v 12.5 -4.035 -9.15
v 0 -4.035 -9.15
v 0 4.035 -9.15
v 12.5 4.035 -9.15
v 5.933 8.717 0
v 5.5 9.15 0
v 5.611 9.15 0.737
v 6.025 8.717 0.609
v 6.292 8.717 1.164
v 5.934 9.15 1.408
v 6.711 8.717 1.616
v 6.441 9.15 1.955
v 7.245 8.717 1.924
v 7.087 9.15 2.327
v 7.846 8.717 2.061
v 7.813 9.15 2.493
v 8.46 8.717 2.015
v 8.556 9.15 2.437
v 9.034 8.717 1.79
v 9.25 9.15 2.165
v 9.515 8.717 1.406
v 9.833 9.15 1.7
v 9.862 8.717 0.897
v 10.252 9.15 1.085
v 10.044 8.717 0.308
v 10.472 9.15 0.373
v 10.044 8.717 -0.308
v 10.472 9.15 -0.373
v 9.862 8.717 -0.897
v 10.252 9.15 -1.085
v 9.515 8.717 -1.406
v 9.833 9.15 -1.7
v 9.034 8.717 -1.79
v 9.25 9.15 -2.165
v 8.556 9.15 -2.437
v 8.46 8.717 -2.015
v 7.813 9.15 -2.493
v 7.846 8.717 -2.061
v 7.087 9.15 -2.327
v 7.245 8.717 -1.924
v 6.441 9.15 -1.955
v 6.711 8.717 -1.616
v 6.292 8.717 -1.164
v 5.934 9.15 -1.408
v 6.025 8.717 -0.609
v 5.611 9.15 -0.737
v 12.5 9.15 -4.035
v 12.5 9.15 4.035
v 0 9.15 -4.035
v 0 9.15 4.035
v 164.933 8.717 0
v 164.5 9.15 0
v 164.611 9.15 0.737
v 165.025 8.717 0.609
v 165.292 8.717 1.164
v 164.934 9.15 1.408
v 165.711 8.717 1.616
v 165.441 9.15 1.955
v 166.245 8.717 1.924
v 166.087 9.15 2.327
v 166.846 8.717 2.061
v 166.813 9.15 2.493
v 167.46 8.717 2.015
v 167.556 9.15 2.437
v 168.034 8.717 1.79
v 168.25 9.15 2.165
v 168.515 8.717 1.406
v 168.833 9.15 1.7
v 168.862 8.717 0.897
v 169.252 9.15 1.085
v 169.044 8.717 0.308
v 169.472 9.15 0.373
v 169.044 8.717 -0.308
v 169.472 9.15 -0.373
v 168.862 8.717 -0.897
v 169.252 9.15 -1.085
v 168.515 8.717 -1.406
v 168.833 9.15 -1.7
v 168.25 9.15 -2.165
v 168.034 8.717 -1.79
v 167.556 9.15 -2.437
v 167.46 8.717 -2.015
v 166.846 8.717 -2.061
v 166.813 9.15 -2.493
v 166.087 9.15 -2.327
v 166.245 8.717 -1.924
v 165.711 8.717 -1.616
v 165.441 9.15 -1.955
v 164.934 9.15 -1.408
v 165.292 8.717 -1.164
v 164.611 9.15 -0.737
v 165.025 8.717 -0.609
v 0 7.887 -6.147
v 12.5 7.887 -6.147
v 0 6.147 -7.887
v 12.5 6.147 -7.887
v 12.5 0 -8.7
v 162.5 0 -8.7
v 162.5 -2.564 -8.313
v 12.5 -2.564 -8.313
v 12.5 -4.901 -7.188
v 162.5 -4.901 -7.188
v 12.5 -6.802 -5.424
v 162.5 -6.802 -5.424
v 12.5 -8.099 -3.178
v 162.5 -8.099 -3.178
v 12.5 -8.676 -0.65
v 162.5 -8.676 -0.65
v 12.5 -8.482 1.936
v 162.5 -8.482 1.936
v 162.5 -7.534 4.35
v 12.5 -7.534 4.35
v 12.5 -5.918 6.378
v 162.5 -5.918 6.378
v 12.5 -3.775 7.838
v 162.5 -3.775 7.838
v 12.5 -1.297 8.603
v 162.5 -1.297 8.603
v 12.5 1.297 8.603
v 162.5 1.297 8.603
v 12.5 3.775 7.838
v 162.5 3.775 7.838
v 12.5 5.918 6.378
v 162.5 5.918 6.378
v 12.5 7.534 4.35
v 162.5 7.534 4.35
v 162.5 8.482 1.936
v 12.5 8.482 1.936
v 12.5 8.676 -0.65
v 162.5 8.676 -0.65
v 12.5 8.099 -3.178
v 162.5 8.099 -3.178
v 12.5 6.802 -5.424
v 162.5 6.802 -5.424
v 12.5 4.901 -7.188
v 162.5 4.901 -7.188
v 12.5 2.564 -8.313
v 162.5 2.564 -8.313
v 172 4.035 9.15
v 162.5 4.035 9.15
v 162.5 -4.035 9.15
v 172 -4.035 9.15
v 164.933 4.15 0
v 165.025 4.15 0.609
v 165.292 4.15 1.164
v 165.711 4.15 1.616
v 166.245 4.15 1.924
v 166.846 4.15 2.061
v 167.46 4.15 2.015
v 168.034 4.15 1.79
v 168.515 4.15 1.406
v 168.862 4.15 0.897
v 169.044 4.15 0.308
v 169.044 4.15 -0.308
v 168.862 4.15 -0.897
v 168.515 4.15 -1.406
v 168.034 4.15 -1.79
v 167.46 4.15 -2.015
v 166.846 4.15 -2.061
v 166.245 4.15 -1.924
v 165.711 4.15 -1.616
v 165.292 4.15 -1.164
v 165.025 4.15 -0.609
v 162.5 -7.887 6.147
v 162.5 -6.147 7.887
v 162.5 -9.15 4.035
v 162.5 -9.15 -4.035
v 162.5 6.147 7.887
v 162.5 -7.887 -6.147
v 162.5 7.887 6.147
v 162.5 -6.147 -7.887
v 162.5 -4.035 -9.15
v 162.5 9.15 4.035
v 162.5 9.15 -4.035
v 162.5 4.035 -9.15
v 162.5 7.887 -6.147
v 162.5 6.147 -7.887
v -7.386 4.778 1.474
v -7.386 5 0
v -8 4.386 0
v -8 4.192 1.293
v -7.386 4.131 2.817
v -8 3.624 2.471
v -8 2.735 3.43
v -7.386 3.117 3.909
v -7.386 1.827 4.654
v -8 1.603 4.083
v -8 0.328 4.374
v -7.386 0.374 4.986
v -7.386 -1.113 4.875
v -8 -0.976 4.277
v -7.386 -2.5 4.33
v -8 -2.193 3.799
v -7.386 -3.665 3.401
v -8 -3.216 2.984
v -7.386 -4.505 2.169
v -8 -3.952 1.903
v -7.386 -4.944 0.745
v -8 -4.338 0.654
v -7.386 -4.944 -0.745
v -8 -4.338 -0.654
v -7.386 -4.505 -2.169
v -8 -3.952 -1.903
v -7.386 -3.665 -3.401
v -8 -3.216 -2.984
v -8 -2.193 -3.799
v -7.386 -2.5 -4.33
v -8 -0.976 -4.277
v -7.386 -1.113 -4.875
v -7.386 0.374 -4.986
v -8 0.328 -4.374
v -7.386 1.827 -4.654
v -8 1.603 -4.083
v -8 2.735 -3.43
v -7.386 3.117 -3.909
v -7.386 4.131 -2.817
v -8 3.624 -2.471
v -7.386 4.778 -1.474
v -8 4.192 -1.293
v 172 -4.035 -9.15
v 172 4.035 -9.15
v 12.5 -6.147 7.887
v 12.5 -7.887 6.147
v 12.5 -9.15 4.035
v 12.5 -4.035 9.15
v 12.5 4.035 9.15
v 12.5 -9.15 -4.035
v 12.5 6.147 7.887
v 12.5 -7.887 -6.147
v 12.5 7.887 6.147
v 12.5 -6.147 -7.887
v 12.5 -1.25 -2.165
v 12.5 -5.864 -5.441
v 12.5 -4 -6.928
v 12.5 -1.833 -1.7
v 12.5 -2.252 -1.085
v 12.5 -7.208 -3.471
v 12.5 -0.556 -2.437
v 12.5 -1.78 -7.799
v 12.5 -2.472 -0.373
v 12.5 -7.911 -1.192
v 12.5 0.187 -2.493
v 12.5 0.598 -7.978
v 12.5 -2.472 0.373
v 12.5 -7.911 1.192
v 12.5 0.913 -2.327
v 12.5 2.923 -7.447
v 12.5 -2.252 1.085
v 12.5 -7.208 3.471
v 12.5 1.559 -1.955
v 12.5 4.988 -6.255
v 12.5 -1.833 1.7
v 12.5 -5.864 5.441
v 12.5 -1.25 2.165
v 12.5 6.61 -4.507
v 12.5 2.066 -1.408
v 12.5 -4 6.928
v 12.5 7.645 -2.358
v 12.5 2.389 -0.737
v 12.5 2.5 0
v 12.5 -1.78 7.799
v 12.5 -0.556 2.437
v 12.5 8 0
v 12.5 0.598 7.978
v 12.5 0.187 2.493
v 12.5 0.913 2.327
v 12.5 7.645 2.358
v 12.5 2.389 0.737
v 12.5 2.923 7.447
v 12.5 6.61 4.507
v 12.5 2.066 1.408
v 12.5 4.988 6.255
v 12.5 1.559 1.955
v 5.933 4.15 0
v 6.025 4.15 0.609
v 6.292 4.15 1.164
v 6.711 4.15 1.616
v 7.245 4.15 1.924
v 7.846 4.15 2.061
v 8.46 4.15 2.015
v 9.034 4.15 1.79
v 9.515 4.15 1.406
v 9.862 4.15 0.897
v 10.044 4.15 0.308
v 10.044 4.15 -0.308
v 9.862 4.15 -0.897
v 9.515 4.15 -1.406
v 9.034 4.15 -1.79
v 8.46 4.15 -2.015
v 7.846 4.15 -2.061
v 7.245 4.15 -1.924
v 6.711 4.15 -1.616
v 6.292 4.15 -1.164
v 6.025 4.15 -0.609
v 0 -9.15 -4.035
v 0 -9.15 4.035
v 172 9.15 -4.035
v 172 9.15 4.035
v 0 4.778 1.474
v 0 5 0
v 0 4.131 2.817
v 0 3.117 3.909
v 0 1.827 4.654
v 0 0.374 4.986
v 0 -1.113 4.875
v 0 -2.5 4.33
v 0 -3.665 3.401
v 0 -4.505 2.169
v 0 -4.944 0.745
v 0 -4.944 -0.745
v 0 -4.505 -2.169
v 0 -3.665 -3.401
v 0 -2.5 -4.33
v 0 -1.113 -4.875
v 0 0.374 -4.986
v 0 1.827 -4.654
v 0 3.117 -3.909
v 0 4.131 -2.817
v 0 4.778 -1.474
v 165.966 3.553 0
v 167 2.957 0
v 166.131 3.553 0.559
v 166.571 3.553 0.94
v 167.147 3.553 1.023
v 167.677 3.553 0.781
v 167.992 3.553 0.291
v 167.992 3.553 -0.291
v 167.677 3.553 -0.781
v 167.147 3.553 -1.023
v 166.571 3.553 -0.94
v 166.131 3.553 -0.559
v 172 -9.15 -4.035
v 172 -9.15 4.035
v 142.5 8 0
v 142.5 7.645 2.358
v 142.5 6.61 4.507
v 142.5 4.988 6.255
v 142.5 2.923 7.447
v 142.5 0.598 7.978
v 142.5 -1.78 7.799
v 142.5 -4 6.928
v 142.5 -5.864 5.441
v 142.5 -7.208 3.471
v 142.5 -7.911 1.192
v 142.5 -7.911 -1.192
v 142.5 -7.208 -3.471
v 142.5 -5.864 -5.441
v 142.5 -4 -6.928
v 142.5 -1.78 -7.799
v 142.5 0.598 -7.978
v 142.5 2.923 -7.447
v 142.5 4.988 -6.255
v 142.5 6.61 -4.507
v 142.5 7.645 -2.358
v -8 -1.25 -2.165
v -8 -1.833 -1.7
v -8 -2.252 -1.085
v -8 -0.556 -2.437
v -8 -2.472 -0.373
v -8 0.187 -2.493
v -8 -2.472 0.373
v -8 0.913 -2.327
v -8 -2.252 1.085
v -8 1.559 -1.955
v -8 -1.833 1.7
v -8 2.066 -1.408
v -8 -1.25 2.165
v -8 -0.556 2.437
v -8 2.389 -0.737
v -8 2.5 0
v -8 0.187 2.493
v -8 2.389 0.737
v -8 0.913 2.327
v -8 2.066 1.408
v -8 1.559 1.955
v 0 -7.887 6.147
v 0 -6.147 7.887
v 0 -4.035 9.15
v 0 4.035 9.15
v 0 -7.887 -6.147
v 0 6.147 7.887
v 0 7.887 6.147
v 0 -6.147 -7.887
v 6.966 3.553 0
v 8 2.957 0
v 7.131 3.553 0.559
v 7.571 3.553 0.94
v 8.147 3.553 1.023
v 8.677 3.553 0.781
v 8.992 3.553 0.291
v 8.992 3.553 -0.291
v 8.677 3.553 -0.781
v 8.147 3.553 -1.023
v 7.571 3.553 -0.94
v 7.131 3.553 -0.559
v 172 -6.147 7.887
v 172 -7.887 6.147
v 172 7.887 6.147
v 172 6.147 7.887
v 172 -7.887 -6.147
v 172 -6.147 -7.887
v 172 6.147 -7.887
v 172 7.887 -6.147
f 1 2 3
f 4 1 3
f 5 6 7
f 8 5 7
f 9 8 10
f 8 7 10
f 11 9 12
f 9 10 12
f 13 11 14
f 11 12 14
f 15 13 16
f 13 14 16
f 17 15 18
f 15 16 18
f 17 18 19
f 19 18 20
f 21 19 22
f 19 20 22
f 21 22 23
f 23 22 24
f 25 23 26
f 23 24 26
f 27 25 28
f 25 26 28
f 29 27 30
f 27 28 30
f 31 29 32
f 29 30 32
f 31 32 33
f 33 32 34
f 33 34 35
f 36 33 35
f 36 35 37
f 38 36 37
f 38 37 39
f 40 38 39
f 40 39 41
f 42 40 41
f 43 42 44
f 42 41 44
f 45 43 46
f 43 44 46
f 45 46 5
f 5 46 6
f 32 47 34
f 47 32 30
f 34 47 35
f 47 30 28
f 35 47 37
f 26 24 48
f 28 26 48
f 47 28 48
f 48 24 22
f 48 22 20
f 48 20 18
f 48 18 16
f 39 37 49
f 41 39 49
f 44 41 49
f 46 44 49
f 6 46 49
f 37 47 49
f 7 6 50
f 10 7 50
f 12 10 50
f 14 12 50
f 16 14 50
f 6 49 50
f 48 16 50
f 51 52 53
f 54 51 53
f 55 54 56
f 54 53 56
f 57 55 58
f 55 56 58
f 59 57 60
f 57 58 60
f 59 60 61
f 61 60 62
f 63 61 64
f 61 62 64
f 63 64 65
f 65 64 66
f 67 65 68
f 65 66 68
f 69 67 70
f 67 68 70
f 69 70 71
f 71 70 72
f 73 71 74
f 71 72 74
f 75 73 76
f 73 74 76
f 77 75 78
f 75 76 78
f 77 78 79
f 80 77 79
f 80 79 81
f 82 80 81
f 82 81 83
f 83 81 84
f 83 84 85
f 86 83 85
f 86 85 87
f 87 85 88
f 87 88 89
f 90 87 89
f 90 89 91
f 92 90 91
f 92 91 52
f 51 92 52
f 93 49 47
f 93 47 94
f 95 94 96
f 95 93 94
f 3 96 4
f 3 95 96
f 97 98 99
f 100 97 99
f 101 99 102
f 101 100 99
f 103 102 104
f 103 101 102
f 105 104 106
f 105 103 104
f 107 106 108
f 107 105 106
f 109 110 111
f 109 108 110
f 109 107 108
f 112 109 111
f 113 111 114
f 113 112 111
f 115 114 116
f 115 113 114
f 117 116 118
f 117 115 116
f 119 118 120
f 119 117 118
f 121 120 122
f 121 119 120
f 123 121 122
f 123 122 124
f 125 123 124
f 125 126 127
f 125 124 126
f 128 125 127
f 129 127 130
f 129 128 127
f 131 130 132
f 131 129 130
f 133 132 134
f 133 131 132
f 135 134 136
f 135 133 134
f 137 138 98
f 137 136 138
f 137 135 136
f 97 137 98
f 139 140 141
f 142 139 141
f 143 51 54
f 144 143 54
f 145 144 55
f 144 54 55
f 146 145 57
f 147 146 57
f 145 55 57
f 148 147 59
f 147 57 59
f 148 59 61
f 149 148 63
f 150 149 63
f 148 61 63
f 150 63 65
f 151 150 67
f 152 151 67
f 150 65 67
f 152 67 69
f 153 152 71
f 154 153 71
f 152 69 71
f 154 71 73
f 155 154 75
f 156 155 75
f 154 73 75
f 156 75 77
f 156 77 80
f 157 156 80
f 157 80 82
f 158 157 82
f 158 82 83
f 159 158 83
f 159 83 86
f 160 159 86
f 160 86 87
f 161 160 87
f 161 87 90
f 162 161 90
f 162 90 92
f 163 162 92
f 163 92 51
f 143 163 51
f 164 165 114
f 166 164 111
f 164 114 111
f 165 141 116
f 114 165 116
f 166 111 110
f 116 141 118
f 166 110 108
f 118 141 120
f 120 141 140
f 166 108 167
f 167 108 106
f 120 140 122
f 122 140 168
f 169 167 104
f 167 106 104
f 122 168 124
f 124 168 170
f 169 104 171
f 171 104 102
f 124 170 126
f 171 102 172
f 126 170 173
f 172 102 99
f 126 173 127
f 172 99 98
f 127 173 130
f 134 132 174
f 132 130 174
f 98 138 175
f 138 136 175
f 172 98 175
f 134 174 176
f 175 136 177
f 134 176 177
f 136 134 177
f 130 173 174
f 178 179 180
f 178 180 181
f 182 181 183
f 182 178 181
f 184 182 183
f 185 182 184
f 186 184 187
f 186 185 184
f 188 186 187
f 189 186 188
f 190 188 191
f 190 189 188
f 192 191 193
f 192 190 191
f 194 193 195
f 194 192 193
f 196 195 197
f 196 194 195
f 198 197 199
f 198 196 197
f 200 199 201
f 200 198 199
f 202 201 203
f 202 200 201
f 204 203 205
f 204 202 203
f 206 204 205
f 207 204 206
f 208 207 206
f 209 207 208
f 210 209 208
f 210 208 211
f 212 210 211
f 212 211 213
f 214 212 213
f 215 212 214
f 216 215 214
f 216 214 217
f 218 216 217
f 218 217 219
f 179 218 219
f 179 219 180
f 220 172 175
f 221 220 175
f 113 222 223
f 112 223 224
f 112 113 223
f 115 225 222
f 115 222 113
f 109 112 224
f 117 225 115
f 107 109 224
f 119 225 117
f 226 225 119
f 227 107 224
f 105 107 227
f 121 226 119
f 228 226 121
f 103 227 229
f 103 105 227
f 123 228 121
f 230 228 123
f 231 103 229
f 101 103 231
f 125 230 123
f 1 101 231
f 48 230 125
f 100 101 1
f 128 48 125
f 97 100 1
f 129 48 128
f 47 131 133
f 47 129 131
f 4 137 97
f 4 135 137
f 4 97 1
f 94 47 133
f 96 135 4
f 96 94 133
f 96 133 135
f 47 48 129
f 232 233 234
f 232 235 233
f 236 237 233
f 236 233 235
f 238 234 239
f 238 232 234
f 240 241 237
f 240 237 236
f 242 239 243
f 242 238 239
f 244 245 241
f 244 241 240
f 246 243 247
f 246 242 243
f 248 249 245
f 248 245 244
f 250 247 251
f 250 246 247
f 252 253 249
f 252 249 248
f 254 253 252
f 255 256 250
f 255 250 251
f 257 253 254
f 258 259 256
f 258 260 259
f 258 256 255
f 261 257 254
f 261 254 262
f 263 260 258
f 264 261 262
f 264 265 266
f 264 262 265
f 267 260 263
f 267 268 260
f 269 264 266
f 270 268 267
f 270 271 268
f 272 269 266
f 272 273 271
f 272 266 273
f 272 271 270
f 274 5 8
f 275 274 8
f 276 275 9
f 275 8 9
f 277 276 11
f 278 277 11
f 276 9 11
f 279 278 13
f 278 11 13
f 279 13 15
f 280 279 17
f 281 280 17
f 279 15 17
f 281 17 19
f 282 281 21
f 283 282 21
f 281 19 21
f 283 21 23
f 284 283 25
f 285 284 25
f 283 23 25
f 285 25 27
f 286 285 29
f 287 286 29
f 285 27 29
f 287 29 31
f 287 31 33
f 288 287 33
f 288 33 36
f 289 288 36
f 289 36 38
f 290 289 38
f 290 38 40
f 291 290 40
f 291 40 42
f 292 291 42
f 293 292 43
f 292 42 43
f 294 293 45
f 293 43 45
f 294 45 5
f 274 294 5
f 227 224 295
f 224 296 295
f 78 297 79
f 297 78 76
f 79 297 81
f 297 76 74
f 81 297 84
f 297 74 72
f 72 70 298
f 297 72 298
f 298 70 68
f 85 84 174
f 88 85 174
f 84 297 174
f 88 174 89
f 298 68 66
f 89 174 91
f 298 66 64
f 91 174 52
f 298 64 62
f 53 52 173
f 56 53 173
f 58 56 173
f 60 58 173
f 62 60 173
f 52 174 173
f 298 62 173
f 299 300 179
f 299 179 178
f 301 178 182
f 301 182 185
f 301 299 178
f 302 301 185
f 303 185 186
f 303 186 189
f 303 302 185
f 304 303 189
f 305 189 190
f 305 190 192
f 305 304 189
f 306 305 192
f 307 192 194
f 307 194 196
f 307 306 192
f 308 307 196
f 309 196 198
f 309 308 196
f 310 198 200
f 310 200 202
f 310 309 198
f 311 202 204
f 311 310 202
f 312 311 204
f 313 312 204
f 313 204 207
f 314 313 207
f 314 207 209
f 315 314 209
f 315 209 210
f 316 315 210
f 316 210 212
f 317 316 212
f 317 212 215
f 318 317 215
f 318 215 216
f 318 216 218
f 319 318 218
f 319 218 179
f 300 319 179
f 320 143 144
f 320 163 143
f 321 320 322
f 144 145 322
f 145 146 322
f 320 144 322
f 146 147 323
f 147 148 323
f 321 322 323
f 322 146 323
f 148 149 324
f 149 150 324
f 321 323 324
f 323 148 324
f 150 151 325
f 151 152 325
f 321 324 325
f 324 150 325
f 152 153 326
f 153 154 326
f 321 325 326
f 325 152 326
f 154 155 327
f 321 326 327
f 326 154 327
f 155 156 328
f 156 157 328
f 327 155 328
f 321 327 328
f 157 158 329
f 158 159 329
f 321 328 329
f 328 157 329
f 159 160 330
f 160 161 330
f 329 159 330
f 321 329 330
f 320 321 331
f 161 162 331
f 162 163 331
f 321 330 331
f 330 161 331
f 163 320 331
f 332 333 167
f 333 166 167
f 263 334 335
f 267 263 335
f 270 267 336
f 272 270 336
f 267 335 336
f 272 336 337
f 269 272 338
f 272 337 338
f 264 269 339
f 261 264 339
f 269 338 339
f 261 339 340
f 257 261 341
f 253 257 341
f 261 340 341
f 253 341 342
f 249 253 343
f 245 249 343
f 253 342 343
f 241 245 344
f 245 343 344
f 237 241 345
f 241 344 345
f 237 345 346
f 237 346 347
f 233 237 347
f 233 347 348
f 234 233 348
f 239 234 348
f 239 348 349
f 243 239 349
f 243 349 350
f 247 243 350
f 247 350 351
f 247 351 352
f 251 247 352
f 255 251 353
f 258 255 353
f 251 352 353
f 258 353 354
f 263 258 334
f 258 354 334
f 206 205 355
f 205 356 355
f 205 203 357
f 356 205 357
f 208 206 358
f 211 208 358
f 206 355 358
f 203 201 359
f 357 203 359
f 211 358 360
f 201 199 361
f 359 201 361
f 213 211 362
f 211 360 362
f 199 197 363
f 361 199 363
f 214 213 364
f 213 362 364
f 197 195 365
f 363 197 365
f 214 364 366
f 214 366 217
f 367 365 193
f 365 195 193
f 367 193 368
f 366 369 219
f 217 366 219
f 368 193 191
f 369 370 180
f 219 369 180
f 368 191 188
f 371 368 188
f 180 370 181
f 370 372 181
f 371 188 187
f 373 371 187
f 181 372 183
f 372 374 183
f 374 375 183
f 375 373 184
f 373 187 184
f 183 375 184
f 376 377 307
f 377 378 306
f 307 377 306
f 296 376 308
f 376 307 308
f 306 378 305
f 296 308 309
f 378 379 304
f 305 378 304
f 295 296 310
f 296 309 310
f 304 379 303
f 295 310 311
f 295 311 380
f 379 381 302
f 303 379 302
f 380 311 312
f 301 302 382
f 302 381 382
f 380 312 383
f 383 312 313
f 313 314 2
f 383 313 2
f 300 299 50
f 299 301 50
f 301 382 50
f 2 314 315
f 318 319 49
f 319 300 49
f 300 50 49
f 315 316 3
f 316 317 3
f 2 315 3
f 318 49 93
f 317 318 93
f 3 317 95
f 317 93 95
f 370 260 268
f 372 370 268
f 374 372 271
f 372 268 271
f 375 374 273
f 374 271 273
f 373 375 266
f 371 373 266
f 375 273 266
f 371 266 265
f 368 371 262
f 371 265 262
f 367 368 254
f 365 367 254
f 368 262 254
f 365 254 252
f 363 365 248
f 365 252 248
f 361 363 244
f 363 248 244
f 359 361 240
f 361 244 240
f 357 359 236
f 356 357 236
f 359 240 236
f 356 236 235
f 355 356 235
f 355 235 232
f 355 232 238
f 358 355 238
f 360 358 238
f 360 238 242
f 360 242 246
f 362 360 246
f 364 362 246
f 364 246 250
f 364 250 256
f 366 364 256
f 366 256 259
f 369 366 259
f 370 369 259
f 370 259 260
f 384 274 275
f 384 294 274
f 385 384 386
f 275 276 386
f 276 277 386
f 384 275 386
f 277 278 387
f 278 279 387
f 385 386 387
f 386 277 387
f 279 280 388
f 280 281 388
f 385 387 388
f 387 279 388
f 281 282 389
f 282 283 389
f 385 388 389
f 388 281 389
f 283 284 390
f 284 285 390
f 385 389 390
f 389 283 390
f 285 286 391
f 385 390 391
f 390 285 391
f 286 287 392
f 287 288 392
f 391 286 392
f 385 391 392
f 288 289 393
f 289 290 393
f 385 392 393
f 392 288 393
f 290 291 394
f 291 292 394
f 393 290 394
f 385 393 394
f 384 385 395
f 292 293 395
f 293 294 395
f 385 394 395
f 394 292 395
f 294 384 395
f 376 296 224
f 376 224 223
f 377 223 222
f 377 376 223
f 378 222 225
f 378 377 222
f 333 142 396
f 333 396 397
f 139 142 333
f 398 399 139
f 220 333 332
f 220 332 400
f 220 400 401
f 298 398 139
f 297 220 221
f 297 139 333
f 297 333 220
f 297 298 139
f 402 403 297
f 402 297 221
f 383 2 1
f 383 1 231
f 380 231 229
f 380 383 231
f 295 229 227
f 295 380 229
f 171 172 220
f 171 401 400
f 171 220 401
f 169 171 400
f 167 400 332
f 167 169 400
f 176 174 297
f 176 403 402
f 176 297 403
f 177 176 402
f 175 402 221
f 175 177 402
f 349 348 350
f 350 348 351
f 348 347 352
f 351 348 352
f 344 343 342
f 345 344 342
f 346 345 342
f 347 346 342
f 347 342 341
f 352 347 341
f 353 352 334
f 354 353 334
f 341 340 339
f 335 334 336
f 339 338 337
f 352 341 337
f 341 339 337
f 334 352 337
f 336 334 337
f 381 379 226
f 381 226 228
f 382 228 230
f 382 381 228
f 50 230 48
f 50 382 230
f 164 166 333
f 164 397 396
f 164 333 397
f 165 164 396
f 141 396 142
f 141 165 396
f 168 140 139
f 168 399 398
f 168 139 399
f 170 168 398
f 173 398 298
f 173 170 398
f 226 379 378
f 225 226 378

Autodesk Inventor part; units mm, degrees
sketch "Sketch_8" plane through (0, 0, 0) normal (0, 0, 1) x (1, 0, 0)
  line L0 (0, 0) -> (-8, 0)
  line L1 (-8, 0) -> (-8, 4.3865)
  line L2 (-8, 4.3865) -> (-7.3865, 5)
  line L3 (-7.3865, 5) -> (0, 5)
  line L4 (0, 5) -> (0, 0)
  line L5 (0, 0) -> (-8, 0)
revolve "Revolution1" add sketch "Sketch_8" angle 360 about axis through (0, 0, 0) along (1, 0, 0)
thread "Thread1" size "M10x1" class "6g" standard "ISO Metric profile" length 5.8865
sketch "Sketch_9" plane through (0, 0, 0) normal (1, 0, 0) x (0, 0, -1)
  line L0 (-9.15, 4.0345) -> (-9.15, -4.0345)
  arc A0 (-9.15, -4.0345) -> (-4.0345, -9.15) centre (0, 0) ccw
  line L1 (-4.0345, -9.15) -> (4.0345, -9.15)
  arc A1 (4.0345, -9.15) -> (9.15, -4.0345) centre (0, 0) ccw
  line L2 (9.15, -4.0345) -> (9.15, 4.0345)
  arc A2 (9.15, 4.0345) -> (4.0345, 9.15) centre (0, 0) ccw
  line L3 (4.0345, 9.15) -> (-4.0345, 9.15)
  arc A3 (-4.0345, 9.15) -> (-9.15, 4.0345) centre (0, 0) ccw
extrude "Extrusion1" add sketch "Sketch_9" along normal blind 12.5
sketch "Sketch_11" plane through (12.5, 0, 0) normal (1, 0, 0) x (0, 0, -1)
  circle A0 centre (0, 0) radius 8.7
extrude "Extrusion2" add sketch "Sketch_11" along normal blind 150
sketch "Sketch_10" plane through (162.5, 0, 0) normal (1, 0, 0) x (0, 0, -1)
  line L0 (-9.15, 4.0345) -> (-9.15, -4.0345)
  arc A0 (-9.15, -4.0345) -> (-4.0345, -9.15) centre (0, 0) ccw
  line L1 (-4.0345, -9.15) -> (4.0345, -9.15)
  arc A1 (4.0345, -9.15) -> (9.15, -4.0345) centre (0, 0) ccw
  line L2 (9.15, -4.0345) -> (9.15, 4.0345)
  arc A2 (9.15, 4.0345) -> (4.0345, 9.15) centre (0, 0) ccw
  line L3 (4.0345, 9.15) -> (-4.0345, 9.15)
  arc A3 (-4.0345, 9.15) -> (-9.15, 4.0345) centre (0, 0) ccw
extrude "Extrusion3" add sketch "Sketch_10" along normal blind 9.5
sketch "Sketch7" plane through (0, 0, 0) normal (0, 0, 1) x (1, 0, 0)
  line L0 (8, 9.15) -> (8, 4.15)
  line L1 (8, 2.9566) -> (5.933, 4.15)
  line L2 (5.933, 4.15) -> (5.933, 8.717)
  line L3 (5.933, 8.717) -> (5.5, 9.15)
  line L4 (5.5, 9.15) -> (8, 9.15)
  line L5 (8, 9.15) -> (8, 2.9566)
revolve "Revolution2" cut sketch "Sketch7" angle 360 about axis through (8, 9.15, 0) along (0, 1, 0)
thread "Thread2" size "M5x0.8" class "6H" standard "ISO Metric profile" full length
sketch "Sketch_7" plane through (0, 0, 0) normal (0, 0, 1) x (1, 0, 0)
  line L0 (167, 9.15) -> (167, 4.15)
  line L1 (167, 2.9566) -> (164.933, 4.15)
  line L2 (164.933, 4.15) -> (164.933, 8.717)
  line L3 (164.933, 8.717) -> (164.5, 9.15)
  line L4 (164.5, 9.15) -> (167, 9.15)
  line L5 (167, 9.15) -> (167, 2.9566)
revolve "Revolution3" cut sketch "Sketch_7" angle 360 about axis through (167, 9.15, 0) along (0, 1, 0)
thread "Thread3" size "M5x0.8" class "6H" standard "ISO Metric profile" full length
sketch "Sketch_16" plane through (0, 0, 0) normal (0, 0, 1) x (1, 0, 0)
  line L0 (142.5, 0) -> (-8, 0)
  line L1 (-8, 0) -> (-8, 2.5)
  line L2 (-8, 2.5) -> (12.5, 2.5)
  line L3 (12.5, 2.5) -> (12.5, 8)
  line L4 (12.5, 8) -> (142.5, 8)
  line L5 (142.5, 8) -> (142.5, 0)
  line L6 (142.5, 0) -> (-8, 0)
revolve "Revolution4" cut sketch "Sketch_16" angle 360 about axis through (142.5, 0, 0) along (1, 0, 0)
ref_plane "BODY_N_XY" through (172, 0, 0) normal (0, 0, -1) x (1, 0, 0)
ref_plane "BODY_N_YZ" through (172, 0, 0) normal (1, 0, 0) x (0, -1, 0)
ref_plane "BODY_N_ZX" through (172, 0, 0) normal (0, -1, 0) x (0, 0, -1)
ref_plane "NUT2_XY" through (172, 0, 0) normal (1, 0, 0) x (0, 0, -1)
ref_plane "NUT2_YZ" through (172, 0, 0) normal (0, 0, -1) x (0, 1, 0)
ref_plane "NUT2_ZX" through (172, 0, 0) normal (0, 1, 0) x (1, 0, 0)
ref_plane "SW1_XY" through (17.5, 0, 0) normal (1, 0, 0) x (0, 0, -1)
ref_plane "SW1_YZ" through (17.5, 0, 0) normal (0, 0, -1) x (0, 1, 0)
ref_plane "SW1_ZX" through (17.5, 0, 0) normal (0, 1, 0) x (1, 0, 0)
ref_plane "SW2_XY" through (157.5, 0, 0) normal (-1, 0, 0) x (0, 0, -1)
ref_plane "SW2_YZ" through (157.5, 0, 0) normal (0, 0, -1) x (0, -1, 0)
ref_plane "SW2_ZX" through (157.5, 0, 0) normal (0, -1, 0) x (-1, 0, 0)
ref_plane "SW_R1_XY" through (17.5, -14.15, 0) normal (1, 0, 0) x (0, 0, -1)
ref_plane "SW_R1_YZ" through (17.5, -14.15, 0) normal (0, 0, -1) x (0, 1, 0)
ref_plane "SW_R1_ZX" through (17.5, -14.15, 0) normal (0, 1, 0) x (1, 0, 0)
ref_plane "SW_R2_XY" through (157.5, -14.15, 0) normal (-1, 0, 0) x (0, 0, -1)
ref_plane "SW_R2_YZ" through (157.5, -14.15, 0) normal (0, 0, -1) x (0, -1, 0)
ref_plane "SW_R2_ZX" through (157.5, -14.15, 0) normal (0, -1, 0) x (-1, 0, 0)
ref_plane "body_XY" through (0, 0, 0) normal (1, 0, 0) x (0, 0, -1)
ref_plane "body_YZ" through (0, 0, 0) normal (0, 0, -1) x (0, 1, 0)
ref_plane "body_ZX" through (0, 0, 0) normal (0, 1, 0) x (1, 0, 0)
properties part number "CJ2B16-125Z(1_0)_BODY" material "ステンレス鋼"
